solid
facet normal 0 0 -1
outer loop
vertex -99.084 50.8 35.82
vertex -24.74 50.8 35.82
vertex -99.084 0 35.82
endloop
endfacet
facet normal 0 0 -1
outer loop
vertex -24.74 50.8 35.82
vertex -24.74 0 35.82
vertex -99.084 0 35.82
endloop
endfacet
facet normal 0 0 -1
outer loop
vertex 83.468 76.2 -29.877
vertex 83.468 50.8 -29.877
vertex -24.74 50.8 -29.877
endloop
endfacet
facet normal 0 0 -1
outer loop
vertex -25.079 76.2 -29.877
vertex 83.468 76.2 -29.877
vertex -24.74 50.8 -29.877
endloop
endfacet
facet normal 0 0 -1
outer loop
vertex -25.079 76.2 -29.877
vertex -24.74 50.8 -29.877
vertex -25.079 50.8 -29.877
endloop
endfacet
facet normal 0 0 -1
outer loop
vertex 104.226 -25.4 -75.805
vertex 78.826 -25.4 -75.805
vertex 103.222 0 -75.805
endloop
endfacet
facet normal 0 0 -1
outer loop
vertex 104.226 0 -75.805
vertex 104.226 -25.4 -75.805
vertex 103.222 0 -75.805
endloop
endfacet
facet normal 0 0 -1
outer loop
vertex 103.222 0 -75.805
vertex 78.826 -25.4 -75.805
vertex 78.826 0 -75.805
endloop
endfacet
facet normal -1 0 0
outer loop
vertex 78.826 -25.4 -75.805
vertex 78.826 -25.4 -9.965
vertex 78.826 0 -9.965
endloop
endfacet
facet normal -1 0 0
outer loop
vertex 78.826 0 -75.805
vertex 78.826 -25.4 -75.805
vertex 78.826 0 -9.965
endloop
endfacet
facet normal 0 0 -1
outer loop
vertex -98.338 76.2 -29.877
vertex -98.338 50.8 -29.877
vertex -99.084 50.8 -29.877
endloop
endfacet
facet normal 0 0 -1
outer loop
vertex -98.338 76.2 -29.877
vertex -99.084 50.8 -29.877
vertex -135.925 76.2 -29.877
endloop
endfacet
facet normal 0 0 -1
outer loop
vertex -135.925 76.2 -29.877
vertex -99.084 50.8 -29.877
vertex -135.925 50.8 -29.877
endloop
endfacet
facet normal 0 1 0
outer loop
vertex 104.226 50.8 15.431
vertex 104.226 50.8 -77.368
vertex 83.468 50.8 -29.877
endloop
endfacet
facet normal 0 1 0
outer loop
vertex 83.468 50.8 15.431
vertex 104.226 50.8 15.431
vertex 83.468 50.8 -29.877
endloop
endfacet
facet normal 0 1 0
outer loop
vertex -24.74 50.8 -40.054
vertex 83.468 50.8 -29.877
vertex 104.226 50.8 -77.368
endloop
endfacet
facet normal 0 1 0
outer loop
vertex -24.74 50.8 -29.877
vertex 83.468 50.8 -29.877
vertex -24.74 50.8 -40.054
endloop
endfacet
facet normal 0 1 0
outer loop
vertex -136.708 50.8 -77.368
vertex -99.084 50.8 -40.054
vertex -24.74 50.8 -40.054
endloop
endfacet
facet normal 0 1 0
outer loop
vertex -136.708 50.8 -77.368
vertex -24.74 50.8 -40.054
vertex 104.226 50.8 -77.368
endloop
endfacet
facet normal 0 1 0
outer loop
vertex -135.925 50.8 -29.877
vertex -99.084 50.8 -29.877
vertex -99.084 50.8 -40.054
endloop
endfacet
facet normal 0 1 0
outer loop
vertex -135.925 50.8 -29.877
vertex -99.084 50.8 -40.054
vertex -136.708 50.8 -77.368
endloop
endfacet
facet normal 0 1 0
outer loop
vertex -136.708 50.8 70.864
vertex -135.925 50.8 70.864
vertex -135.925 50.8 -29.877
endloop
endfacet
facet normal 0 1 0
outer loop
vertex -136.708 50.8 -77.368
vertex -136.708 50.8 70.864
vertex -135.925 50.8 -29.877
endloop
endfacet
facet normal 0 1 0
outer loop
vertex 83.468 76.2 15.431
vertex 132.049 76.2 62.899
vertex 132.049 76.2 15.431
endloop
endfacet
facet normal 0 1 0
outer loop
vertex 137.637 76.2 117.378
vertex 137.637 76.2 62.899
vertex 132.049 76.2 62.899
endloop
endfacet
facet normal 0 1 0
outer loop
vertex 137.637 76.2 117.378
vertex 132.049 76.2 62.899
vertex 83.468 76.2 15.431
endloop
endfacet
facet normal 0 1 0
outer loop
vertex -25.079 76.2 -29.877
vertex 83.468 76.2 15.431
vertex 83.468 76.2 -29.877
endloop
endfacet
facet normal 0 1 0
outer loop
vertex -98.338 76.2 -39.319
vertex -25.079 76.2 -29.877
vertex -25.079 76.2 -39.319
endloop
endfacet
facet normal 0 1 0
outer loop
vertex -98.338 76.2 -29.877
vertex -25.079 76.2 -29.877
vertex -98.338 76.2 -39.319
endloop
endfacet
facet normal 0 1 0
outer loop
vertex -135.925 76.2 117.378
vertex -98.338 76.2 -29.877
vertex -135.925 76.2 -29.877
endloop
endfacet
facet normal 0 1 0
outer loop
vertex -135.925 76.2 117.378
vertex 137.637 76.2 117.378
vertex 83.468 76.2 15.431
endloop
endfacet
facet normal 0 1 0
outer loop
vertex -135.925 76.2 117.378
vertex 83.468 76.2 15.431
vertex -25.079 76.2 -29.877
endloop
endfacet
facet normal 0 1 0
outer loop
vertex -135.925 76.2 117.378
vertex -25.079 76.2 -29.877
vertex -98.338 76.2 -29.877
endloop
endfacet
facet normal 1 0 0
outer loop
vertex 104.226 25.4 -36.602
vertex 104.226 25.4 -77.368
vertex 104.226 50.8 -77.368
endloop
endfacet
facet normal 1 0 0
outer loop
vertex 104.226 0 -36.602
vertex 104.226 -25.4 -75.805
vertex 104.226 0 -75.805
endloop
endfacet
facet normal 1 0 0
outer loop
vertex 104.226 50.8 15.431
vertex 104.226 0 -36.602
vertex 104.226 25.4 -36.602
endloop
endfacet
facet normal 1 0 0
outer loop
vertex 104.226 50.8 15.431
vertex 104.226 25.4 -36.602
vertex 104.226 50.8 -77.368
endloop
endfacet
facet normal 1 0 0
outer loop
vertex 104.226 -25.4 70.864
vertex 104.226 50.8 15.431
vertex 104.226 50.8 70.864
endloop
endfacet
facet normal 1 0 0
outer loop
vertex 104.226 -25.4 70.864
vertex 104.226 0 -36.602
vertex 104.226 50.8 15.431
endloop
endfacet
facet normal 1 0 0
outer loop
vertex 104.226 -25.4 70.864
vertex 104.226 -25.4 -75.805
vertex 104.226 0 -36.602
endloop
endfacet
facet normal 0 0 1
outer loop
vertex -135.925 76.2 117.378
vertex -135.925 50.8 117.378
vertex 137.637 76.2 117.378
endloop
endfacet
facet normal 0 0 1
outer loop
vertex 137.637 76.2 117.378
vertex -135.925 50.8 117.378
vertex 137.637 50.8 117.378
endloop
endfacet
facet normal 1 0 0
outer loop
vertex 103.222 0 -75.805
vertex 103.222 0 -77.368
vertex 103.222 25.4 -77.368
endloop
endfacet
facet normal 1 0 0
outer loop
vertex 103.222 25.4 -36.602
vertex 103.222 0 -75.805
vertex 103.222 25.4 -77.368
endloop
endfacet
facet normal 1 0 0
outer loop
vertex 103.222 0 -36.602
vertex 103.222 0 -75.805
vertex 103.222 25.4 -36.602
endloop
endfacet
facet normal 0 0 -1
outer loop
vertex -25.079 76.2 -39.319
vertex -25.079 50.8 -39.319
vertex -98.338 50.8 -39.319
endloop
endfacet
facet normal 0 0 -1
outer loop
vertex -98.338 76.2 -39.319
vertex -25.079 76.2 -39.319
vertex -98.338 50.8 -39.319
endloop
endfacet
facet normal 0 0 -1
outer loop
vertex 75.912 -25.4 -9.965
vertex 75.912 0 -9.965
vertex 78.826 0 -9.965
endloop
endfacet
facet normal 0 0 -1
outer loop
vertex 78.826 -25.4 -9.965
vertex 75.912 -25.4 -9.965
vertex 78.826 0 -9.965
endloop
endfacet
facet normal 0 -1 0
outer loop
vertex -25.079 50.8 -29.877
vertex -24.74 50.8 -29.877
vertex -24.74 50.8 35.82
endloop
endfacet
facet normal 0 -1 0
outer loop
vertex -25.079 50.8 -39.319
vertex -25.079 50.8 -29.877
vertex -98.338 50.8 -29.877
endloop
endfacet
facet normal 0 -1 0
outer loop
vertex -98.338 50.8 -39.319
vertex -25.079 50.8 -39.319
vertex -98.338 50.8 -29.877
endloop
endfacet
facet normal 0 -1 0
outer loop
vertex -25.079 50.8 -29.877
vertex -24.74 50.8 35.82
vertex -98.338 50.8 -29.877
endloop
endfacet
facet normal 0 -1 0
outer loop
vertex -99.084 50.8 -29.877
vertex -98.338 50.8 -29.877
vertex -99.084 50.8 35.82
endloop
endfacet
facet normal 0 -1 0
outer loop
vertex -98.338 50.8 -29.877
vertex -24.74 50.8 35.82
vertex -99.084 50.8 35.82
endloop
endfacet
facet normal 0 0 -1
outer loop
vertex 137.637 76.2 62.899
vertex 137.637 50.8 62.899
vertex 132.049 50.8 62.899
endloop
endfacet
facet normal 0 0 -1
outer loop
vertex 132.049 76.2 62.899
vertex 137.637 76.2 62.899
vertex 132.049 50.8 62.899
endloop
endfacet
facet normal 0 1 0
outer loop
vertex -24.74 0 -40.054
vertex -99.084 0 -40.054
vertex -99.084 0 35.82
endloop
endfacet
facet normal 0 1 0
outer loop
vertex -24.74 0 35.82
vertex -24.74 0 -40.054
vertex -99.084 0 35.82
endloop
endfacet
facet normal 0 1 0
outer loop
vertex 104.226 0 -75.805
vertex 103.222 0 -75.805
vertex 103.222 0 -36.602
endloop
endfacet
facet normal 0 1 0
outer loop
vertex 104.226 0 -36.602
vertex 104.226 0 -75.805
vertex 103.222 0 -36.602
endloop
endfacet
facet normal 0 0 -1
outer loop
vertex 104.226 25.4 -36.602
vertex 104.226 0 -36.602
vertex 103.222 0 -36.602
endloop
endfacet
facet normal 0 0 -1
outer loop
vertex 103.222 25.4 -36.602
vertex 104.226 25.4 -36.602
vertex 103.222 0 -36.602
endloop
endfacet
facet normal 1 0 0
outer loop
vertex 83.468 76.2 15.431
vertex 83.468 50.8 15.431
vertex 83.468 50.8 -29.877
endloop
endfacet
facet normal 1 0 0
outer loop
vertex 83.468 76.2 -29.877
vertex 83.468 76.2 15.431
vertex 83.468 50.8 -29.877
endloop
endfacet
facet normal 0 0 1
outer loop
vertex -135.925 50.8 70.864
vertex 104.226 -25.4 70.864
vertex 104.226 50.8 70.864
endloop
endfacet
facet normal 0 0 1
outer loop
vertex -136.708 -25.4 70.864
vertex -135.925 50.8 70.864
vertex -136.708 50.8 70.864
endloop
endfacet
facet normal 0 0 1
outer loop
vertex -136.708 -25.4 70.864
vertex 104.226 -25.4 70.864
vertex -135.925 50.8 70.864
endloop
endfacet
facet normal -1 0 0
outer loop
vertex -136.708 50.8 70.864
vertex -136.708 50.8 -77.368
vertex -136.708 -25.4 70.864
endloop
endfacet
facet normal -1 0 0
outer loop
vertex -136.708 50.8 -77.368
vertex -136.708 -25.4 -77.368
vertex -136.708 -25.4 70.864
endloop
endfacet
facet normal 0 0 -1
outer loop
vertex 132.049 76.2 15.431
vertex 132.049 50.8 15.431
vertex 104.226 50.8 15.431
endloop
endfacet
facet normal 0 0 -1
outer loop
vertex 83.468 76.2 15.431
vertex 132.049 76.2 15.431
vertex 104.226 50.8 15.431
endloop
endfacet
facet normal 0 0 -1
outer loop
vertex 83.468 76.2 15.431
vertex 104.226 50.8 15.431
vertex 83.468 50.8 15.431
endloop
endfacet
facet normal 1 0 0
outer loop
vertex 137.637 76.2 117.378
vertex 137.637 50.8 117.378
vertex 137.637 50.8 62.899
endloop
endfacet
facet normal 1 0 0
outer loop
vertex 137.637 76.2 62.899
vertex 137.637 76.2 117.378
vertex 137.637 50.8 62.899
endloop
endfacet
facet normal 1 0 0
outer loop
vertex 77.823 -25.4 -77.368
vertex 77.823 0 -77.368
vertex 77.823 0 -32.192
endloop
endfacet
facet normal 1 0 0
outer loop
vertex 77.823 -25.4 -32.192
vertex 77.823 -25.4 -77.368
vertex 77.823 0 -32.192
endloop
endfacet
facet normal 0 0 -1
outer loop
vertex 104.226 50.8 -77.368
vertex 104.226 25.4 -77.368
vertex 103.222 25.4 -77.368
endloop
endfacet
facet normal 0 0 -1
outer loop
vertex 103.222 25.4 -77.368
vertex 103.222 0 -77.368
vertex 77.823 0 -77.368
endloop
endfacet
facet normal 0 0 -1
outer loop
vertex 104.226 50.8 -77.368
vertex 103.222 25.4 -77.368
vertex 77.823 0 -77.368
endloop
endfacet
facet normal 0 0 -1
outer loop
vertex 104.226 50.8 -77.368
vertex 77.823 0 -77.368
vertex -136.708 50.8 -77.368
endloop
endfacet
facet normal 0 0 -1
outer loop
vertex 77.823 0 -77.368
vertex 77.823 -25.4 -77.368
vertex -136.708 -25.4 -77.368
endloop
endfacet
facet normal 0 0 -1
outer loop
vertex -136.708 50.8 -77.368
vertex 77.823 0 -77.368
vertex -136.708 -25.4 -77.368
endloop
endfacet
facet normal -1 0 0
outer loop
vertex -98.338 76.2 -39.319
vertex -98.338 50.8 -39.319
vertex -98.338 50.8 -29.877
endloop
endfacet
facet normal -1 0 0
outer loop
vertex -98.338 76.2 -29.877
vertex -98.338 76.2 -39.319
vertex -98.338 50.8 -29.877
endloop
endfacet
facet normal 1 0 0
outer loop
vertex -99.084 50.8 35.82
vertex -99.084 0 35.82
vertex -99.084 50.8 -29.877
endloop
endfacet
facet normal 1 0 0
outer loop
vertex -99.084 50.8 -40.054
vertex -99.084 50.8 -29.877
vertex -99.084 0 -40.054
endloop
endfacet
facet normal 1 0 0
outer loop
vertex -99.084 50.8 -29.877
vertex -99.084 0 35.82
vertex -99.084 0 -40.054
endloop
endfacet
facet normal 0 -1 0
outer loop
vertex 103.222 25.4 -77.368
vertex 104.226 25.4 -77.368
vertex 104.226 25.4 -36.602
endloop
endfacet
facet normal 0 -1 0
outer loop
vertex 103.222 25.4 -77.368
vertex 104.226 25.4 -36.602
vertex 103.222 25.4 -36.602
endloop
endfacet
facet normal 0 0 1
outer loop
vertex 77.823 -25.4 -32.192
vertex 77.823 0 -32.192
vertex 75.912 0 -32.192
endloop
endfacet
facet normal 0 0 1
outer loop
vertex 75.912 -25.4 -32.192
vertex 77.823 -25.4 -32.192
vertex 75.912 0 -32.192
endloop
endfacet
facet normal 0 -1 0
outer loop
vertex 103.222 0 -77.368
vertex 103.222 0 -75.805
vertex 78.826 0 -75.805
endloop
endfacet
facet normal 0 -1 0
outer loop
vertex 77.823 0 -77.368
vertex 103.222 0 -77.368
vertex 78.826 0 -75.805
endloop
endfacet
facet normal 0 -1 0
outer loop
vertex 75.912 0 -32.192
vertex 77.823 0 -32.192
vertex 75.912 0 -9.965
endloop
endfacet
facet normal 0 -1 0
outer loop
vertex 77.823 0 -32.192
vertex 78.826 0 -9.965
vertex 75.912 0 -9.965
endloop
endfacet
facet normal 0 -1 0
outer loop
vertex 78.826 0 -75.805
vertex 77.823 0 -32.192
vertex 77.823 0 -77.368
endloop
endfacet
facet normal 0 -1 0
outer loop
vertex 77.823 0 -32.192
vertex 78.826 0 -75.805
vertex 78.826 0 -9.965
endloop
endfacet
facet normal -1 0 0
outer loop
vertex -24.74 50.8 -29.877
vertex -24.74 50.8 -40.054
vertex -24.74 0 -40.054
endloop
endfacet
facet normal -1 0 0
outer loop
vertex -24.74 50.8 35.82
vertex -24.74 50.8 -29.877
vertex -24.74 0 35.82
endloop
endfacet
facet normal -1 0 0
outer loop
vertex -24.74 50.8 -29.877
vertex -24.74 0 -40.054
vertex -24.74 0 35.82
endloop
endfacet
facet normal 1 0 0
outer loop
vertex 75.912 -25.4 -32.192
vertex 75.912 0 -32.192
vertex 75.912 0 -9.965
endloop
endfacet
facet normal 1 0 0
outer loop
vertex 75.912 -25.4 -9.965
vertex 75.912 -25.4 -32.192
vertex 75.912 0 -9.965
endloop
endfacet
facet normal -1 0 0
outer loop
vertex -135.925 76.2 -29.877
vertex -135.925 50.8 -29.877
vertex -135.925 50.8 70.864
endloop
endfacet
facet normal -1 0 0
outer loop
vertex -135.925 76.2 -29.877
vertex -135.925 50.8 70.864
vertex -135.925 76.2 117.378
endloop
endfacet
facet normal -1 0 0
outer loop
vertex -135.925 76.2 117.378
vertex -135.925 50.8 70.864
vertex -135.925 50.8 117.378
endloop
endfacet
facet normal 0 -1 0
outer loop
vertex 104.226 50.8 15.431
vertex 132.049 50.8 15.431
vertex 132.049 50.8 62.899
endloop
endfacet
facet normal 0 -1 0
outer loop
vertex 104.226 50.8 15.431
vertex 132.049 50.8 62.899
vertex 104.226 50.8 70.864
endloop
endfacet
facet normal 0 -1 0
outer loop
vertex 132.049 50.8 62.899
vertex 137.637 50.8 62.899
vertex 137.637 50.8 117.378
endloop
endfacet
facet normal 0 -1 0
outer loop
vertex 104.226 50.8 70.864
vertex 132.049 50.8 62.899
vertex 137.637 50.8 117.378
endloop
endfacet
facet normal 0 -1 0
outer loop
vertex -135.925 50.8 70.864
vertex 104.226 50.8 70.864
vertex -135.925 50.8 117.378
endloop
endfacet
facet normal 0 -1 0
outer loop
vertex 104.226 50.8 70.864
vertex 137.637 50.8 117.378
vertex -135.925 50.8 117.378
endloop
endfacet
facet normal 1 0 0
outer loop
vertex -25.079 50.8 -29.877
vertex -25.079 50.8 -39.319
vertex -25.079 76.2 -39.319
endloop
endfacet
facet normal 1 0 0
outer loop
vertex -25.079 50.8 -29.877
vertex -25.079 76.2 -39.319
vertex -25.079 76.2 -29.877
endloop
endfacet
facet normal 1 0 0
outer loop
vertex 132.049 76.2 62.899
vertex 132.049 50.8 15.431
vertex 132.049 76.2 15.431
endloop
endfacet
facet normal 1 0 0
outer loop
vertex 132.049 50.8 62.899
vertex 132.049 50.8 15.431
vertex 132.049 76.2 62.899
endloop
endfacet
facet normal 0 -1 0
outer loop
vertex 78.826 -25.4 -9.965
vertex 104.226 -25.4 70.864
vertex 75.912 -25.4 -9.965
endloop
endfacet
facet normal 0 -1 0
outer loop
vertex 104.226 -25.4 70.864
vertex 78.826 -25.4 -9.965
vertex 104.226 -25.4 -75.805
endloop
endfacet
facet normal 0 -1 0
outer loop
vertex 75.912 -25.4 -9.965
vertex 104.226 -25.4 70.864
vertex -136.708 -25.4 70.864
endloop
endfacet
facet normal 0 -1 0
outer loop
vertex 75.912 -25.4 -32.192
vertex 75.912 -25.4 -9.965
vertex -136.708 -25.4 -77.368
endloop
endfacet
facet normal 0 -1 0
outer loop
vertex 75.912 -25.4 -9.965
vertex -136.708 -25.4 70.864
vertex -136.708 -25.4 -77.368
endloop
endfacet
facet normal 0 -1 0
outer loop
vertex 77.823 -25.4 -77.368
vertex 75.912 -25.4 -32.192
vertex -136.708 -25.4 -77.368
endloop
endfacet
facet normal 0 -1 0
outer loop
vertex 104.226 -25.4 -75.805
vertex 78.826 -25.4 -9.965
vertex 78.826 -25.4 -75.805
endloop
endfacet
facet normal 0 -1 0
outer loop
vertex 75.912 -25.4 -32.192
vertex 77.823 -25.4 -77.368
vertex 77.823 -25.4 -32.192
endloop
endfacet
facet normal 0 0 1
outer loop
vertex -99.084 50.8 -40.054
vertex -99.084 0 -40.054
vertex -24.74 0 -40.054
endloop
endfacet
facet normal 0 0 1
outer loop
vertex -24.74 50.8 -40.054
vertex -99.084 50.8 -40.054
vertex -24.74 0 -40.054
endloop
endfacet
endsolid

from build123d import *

# Parameters (mm, degrees)
F0_W      = 212.6203179359
F0_H      = 22.2269091755
F1_DEPTH  = 25.4
F2_W      = 13.6859714985
F2_H      = 40.4146937653
F3_DEPTH  = 25.4
F5_DEPTH  = 25.4
F7_DEPTH  = 25.4
F8_W      = 86.2983710408
F8_H      = 107.4658855796
F9_DEPTH  = 25.4
F10_W     = 85.29484272
F10_H     = 40.7659783959
F11_DEPTH = 25.4
F12_W     = 86.2983710408
F12_H     = 148.2318639755
F13_DEPTH = 25.4
F15_W     = 73.2594318688
F15_H     = 64.30112198
F15_H_2   = 9.4412900507
F15_W_2   = 48.5810935497
F15_H_3   = 47.4680401385
F15_W_3   = 54.1693717241
F15_H_4   = 43.5468889773
F16_DEPTH = 25.4


with BuildPart() as f1:
    # F0 (on Front) → F1 (new body)
    with BuildSketch(Plane.XZ):
        Polygon((-136.7080956697, 70.86391747), (-136.7080956697, -9.9654700607), (75.9122222662, -9.9654700607), (78.8259357214, -9.9654700607), (78.8259357214, 70.86391747), align=None)
        with Locations((-30.3979367018, -21.0789246485)):
            Rectangle(F0_W, F0_H)
        Polygon((75.9122222662, -32.1923792362), (-136.7080956697, -32.1923792362), (-136.7080956697, -77.3679465055), (77.8233259916, -77.3679465055), (77.8233259916, -32.1923792362), align=None)
    extrude(amount=F1_DEPTH)

    # F2 (on face) → F3 (join)
    with BuildSketch(Plane.YZ.offset(78.8259357214)):
        Polygon((0, 30.4492237046), (0, 70.86391747), (-25.4, 70.86391747), (-25.4, -75.8049190044), (0, -75.8049190044), (0, -9.9654700607), (-13.6859714985, -9.9654700607), (-13.6859714985, 30.4492237046), align=None)
        with Locations((-6.8429857492, 10.241876822)):
            Rectangle(F2_W, F2_H)
    extrude(amount=F3_DEPTH)

    # F4 (on face) → F5 (join)
    with BuildSketch(Plane(origin=(0, 0, 0), x_dir=(-1, 0, 0), z_dir=(0, 1, 0))):
        Polygon((75.8066177368, -40.0540344417), (75.8066177368, -77.3679465055), (136.7080956697, -77.3679465055), (136.7080956697, 70.86391747), (75.8066177368, 70.86391747), (75.8066177368, 35.8203239739), (99.0835726261, 35.8203239739), (99.0835726261, -40.0540344417), align=None)
        Polygon((-17.9275646806, -77.3679465055), (75.8066177368, -77.3679465055), (75.8066177368, -40.0540344417), (24.7398540378, -40.0540344417), (24.7398540378, 35.8203239739), (75.8066177368, 35.8203239739), (75.8066177368, 70.86391747), (-17.9275646806, 70.86391747), align=None)
    extrude(amount=F5_DEPTH)

    # F6 (on face) → F7 (join)
    with BuildSketch(Plane(origin=(0, 25.4, 0), x_dir=(-1, 0, 0), z_dir=(0, 1, 0))):
        Polygon((24.7398540378, -40.0540344417), (24.7398540378, 14.7684887052), (-17.9275646806, 14.7684887052), (-17.9275646806, -77.3679465055), (77.9451653361, -77.3679465055), (77.9451653361, -40.0540344417), align=None)
        Polygon((-17.9275646806, 14.7684887052), (24.7398540378, 14.7684887052), (24.7398540378, 35.8203239739), (77.9451653361, 35.8203239739), (77.9451653361, 70.86391747), (-17.9275646806, 70.86391747), align=None)
        Polygon((77.9451653361, 70.86391747), (77.9451653361, 35.8203239739), (99.0835726261, 35.8203239739), (99.0835726261, -40.0540344417), (77.9451653361, -40.0540344417), (77.9451653361, -77.3679465055), (136.7080956697, -77.3679465055), (136.7080956697, 70.86391747), align=None)
    extrude(amount=F7_DEPTH)

    # F8 (on face) → F9 (join)
    with BuildSketch(Plane(origin=(0, 0, 0), x_dir=(-1, 0, 0), z_dir=(0, 1, 0))):
        with Locations((-61.076750201, 17.1309746802)):
            Rectangle(F8_W, F8_H)
    extrude(amount=F9_DEPTH)

    # F10 (on face) → F11 (join)
    with BuildSketch(Plane(origin=(0, 0, 0), x_dir=(-1, 0, 0), z_dir=(0, 1, 0))):
        with Locations((-60.5749860406, -56.9849573076)):
            Rectangle(F10_W, F10_H)
    extrude(amount=F11_DEPTH)

    # F12 (on face) → F13 (join)
    with BuildSketch(Plane(origin=(0, 25.4, 0), x_dir=(-1, 0, 0), z_dir=(0, 1, 0))):
        with Locations((-61.076750201, -3.2520145178)):
            Rectangle(F12_W, F12_H)
    extrude(amount=F13_DEPTH)

    # F15 (on face) → F16 (join)
    with BuildSketch(Plane(origin=(0, 50.8, 0), x_dir=(-1, 0, 0), z_dir=(0, 1, 0))):
        Polygon((25.0786952674, -29.877435416), (25.0786952674, 34.423686564), (98.3381271362, 34.423686564), (98.3381271362, -29.877435416), (135.9246820211, -29.877435416), (135.9246820211, 117.3784919083), (-83.4680050611, 117.3784919083), (-83.4680050611, 73.831602931), (-83.4680050611, 62.8992691636), (-83.4680050611, 15.4312290251), (-83.4680050611, -29.877435416), align=None)
        with Locations((61.7084112018, 2.273125574)):
            Rectangle(F15_W, F15_H)
        with Locations((61.7084112018, -34.5980804414)):
            Rectangle(F15_W, F15_H_2)
        with Locations((-107.758551836, 39.1652490944)):
            Rectangle(F15_W_2, F15_H_3)
        Polygon((-132.0490986109, 62.8992691636), (-83.4680050611, 62.8992691636), (-83.4680050611, 73.831602931), (-137.6373767853, 73.831602931), (-137.6373767853, 62.8992691636), align=None)
        with Locations((-110.5526909232, 95.6050474197)):
            Rectangle(F15_W_3, F15_H_4)
    extrude(amount=F16_DEPTH)


solid = f1.part
